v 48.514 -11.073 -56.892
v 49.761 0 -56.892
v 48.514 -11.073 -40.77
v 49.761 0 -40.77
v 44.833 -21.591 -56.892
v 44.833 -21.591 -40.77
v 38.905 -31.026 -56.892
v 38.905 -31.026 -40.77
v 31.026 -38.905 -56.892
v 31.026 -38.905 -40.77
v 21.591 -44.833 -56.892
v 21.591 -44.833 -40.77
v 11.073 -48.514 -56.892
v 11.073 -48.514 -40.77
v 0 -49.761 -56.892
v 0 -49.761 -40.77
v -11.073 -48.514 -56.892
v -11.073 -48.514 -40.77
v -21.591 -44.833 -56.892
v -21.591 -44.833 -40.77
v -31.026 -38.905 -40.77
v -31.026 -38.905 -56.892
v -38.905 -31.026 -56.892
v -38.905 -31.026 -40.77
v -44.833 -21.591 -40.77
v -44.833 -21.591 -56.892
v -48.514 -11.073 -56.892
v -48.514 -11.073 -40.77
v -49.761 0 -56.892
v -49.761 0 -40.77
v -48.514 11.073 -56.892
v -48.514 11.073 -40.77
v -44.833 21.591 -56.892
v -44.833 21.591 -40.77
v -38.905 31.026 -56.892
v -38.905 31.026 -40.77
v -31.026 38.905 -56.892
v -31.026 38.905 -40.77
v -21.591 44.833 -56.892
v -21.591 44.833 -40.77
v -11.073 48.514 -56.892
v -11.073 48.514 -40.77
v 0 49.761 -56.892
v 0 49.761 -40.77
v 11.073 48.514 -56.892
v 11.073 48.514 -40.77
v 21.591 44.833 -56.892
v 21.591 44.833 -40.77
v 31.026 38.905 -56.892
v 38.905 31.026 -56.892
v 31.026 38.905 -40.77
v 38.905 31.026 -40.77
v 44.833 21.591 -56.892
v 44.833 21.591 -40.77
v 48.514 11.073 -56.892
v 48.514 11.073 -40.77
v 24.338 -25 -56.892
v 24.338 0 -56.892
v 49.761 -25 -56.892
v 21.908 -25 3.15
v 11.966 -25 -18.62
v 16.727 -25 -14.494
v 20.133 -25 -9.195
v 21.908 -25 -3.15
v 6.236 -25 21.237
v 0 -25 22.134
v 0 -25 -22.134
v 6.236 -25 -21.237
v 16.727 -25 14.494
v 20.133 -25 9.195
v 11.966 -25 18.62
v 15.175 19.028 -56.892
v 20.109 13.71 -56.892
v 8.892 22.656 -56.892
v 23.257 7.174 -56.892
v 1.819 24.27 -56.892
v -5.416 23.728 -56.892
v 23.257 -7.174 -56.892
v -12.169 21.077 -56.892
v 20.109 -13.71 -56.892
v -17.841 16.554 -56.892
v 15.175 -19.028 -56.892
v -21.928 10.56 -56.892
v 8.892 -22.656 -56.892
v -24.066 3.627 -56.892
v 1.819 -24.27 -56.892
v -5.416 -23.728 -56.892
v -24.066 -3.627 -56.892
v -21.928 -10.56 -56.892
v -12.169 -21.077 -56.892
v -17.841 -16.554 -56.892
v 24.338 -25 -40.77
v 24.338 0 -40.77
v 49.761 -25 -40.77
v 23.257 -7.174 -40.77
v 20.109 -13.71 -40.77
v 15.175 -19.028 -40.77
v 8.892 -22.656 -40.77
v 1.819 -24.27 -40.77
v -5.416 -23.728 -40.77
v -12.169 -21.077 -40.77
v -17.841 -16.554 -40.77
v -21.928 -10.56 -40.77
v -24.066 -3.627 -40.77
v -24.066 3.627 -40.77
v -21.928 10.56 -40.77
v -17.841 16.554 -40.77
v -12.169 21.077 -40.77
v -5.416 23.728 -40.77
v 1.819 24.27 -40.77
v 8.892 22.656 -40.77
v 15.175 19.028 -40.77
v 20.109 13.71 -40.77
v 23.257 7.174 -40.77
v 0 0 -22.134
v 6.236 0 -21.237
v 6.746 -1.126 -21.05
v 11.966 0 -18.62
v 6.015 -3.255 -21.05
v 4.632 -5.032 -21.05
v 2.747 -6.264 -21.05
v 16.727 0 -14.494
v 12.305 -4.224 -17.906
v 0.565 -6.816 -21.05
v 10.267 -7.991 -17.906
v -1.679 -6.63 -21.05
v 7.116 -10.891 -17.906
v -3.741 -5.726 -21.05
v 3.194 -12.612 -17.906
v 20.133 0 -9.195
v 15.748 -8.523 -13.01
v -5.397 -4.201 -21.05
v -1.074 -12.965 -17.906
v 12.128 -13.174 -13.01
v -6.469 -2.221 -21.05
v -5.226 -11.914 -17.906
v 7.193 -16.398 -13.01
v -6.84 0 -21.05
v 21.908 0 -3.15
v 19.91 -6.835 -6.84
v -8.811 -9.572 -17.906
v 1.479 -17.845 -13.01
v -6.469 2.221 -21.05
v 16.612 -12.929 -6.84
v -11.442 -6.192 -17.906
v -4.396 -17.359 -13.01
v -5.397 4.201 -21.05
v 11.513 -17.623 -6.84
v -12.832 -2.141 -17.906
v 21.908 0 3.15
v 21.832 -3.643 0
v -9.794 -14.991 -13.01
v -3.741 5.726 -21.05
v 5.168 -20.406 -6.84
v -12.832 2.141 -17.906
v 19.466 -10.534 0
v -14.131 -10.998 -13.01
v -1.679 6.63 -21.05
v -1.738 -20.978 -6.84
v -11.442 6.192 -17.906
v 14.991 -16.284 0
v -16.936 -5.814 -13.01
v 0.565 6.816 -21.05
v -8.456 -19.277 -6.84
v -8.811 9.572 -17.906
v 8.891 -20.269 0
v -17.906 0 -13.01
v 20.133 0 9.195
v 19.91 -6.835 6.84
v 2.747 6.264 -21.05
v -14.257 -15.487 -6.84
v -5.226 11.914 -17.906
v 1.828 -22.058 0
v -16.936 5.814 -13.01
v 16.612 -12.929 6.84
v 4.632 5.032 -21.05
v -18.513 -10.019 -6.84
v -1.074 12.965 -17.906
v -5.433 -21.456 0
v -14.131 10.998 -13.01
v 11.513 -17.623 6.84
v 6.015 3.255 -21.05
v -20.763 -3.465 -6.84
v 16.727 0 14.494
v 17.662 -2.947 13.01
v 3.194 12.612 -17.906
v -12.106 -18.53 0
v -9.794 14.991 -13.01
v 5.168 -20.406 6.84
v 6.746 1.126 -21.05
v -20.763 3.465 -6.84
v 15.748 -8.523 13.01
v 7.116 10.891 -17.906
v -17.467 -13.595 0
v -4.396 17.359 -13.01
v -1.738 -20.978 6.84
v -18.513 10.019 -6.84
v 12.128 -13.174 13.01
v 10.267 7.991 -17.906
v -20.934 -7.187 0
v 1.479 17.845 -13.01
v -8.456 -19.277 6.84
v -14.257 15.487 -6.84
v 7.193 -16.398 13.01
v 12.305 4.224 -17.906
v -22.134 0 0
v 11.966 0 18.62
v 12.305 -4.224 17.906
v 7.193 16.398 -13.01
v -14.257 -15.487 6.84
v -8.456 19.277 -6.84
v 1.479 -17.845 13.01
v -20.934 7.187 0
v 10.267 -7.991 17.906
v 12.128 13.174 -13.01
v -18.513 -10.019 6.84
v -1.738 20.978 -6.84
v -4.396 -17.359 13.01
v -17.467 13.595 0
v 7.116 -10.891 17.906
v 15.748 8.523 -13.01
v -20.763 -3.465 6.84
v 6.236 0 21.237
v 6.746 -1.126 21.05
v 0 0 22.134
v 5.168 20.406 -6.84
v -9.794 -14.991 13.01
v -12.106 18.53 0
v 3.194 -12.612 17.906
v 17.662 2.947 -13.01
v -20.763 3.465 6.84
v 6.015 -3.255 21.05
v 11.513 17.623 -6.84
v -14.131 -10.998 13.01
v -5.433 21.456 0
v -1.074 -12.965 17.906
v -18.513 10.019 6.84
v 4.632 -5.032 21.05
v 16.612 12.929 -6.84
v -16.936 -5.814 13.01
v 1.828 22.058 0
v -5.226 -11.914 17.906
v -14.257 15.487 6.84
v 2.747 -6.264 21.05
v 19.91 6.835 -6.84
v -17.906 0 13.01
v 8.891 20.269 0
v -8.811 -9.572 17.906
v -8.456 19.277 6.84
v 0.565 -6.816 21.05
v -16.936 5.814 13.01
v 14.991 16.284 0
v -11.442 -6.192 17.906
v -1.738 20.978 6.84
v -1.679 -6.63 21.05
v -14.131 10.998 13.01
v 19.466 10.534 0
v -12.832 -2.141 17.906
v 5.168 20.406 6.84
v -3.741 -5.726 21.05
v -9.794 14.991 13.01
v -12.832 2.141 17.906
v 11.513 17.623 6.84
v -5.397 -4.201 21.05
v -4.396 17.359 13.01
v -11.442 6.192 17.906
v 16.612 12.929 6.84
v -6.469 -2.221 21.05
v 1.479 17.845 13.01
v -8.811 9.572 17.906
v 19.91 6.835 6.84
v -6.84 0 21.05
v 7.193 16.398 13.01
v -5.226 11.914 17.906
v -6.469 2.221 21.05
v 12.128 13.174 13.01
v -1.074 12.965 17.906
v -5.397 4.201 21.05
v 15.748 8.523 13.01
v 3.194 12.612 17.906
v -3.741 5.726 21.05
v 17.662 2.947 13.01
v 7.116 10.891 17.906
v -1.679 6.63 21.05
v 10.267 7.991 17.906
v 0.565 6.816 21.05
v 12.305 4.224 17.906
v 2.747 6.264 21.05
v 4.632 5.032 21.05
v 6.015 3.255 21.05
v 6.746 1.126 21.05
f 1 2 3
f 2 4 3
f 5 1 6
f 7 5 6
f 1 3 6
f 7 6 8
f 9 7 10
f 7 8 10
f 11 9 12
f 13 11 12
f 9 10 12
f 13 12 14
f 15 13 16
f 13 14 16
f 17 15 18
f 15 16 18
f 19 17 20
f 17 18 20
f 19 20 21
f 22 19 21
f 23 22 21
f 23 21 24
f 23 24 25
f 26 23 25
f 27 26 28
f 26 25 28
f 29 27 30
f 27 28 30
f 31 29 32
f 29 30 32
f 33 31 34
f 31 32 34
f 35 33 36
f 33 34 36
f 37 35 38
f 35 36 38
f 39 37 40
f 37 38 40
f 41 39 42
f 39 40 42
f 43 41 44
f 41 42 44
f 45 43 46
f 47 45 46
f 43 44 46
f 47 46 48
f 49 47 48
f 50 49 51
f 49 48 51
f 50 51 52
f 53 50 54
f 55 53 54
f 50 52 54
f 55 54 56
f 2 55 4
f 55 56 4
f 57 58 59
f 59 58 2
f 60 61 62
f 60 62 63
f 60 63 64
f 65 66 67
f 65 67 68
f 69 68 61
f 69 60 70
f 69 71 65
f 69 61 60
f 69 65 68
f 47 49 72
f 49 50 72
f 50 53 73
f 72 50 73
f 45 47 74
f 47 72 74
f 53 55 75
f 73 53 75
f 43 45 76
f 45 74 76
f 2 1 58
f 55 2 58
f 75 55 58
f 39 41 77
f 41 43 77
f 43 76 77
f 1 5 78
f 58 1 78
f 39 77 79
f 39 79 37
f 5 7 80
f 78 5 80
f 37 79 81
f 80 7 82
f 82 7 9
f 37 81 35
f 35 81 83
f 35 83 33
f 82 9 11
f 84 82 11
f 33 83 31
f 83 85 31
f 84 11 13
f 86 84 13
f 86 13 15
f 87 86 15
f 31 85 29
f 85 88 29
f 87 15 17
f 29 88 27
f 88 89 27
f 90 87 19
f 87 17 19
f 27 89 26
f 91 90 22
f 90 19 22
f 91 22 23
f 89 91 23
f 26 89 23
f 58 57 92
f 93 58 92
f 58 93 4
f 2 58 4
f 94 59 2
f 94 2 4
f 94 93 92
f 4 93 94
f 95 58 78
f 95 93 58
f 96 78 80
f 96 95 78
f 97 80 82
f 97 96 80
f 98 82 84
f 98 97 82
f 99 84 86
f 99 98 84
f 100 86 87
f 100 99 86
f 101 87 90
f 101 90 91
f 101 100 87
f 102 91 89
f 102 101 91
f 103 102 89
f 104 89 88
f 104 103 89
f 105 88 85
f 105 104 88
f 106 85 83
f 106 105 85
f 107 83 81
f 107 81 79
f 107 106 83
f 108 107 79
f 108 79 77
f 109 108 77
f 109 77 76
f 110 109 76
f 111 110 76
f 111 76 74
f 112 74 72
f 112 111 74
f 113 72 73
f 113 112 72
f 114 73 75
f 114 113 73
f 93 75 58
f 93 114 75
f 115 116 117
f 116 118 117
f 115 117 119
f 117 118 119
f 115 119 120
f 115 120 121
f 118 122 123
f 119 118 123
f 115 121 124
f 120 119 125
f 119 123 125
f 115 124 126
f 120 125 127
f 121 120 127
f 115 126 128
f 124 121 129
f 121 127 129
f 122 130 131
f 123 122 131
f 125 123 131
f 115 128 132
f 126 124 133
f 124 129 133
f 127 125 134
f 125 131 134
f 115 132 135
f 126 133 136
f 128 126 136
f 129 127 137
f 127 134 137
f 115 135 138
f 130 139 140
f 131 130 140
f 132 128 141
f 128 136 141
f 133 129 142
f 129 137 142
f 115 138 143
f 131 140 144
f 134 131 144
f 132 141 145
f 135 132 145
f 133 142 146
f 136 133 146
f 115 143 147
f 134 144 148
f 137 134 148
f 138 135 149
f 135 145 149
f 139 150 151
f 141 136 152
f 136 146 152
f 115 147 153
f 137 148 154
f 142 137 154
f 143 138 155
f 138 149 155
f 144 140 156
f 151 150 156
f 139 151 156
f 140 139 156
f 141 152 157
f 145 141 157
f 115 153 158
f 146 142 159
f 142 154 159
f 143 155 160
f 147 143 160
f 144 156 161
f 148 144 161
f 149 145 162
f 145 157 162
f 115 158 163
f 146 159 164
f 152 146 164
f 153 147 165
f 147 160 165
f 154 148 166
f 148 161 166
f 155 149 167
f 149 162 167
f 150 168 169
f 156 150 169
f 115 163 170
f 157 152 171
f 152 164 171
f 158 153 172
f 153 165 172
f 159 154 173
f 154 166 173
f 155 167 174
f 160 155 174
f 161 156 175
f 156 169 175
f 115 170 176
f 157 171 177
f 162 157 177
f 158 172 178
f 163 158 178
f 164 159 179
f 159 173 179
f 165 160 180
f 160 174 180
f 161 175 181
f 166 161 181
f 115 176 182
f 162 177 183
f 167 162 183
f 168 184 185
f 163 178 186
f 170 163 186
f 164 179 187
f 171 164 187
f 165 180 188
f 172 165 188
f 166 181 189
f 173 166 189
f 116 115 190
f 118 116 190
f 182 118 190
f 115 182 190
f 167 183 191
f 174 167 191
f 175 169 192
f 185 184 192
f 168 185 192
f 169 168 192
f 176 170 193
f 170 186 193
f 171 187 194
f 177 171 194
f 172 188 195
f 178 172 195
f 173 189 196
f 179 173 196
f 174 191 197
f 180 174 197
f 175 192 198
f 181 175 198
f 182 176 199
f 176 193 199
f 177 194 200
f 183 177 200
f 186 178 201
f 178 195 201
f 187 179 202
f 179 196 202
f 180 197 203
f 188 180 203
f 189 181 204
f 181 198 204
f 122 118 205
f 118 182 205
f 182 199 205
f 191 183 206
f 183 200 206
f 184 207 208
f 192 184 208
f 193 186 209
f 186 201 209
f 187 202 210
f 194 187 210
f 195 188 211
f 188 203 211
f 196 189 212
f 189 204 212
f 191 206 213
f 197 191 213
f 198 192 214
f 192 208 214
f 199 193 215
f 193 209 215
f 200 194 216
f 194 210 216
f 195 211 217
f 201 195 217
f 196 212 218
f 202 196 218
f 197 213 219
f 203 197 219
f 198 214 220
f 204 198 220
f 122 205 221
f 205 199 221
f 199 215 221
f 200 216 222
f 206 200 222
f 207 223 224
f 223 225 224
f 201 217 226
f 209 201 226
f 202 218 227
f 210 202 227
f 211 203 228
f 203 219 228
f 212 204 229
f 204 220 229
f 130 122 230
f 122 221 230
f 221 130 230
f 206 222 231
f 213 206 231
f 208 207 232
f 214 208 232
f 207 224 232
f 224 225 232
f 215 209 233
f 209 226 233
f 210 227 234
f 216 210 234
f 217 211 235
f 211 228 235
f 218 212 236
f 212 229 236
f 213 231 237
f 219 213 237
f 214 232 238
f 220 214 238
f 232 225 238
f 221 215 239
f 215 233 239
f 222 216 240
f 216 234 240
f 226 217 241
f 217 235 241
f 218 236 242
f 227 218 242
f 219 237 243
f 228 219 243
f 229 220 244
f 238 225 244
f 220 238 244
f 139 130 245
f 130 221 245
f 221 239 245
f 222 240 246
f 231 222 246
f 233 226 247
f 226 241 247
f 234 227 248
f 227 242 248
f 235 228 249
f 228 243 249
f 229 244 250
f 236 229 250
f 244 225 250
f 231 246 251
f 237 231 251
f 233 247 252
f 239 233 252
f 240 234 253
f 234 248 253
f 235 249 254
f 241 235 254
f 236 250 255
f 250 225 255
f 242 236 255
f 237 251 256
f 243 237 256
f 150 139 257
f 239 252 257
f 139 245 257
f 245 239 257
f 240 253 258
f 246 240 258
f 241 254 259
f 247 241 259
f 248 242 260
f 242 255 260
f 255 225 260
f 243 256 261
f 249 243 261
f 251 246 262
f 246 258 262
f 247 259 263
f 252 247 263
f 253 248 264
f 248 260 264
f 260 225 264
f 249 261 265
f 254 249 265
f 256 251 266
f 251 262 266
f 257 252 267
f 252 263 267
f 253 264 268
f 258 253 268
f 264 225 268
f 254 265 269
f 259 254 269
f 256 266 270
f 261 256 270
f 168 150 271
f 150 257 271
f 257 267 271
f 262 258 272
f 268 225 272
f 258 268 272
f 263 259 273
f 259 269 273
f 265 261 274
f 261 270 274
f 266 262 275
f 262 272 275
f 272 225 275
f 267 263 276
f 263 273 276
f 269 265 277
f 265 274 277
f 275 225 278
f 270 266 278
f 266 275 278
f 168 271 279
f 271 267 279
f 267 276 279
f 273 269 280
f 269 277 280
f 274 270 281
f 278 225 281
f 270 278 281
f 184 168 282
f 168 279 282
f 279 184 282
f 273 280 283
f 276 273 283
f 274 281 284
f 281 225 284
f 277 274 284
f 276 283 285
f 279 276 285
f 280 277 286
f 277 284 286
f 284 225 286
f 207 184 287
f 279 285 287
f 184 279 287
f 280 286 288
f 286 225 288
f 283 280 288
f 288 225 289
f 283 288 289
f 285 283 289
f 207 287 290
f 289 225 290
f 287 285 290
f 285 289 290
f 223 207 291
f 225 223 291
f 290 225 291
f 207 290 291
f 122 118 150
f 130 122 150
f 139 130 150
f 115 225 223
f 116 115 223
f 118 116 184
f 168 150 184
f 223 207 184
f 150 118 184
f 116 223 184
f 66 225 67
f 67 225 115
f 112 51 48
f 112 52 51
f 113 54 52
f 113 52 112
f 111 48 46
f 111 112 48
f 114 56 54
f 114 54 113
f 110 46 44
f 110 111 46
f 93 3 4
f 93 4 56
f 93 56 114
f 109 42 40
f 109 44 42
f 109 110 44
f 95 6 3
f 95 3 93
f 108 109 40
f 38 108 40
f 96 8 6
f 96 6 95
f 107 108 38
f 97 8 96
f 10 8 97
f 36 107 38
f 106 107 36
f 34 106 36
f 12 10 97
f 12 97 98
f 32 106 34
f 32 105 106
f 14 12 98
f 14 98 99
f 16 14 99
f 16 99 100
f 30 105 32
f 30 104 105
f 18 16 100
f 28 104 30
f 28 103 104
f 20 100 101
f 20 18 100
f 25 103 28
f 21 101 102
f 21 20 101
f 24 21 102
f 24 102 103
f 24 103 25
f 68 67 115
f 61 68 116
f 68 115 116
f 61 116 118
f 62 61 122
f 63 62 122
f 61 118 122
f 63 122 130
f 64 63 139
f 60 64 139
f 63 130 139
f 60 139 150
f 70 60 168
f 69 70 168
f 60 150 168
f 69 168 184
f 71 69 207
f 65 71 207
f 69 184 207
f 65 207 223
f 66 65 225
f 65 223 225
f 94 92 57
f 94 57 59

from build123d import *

# Parameters (mm, degrees)
F0_W     = 25.423225
F0_H     = 16.12205
F2_DEPTH = 25


with BuildPart() as f1:
    # F0 (on Front) → F1 (revolve)
    with BuildSketch(Plane.XZ):
        with BuildLine():
            Line((0, 22.133641), (0, -22.133641))
            ThreePointArc((0, -22.133641), (22.133641, 0), (0, 22.133641))
        make_face()
        with Locations((37.049706, -48.831202)):
            Rectangle(F0_W, F0_H)
    revolve(axis=Axis((0, 0, -2.325295), (0, 0, -1)))


with BuildPart() as f2:
    # F0 (on Front) → F2 (new body)
    with BuildSketch(Plane.XZ):
        with BuildLine():
            Line((0, 22.133641), (0, -22.133641))
            ThreePointArc((0, -22.133641), (22.133641, 0), (0, 22.133641))
        make_face()
        with Locations((37.049706, -48.831202)):
            Rectangle(F0_W, F0_H)
    extrude(amount=F2_DEPTH)


solid = Compound([f1.part, f2.part])
